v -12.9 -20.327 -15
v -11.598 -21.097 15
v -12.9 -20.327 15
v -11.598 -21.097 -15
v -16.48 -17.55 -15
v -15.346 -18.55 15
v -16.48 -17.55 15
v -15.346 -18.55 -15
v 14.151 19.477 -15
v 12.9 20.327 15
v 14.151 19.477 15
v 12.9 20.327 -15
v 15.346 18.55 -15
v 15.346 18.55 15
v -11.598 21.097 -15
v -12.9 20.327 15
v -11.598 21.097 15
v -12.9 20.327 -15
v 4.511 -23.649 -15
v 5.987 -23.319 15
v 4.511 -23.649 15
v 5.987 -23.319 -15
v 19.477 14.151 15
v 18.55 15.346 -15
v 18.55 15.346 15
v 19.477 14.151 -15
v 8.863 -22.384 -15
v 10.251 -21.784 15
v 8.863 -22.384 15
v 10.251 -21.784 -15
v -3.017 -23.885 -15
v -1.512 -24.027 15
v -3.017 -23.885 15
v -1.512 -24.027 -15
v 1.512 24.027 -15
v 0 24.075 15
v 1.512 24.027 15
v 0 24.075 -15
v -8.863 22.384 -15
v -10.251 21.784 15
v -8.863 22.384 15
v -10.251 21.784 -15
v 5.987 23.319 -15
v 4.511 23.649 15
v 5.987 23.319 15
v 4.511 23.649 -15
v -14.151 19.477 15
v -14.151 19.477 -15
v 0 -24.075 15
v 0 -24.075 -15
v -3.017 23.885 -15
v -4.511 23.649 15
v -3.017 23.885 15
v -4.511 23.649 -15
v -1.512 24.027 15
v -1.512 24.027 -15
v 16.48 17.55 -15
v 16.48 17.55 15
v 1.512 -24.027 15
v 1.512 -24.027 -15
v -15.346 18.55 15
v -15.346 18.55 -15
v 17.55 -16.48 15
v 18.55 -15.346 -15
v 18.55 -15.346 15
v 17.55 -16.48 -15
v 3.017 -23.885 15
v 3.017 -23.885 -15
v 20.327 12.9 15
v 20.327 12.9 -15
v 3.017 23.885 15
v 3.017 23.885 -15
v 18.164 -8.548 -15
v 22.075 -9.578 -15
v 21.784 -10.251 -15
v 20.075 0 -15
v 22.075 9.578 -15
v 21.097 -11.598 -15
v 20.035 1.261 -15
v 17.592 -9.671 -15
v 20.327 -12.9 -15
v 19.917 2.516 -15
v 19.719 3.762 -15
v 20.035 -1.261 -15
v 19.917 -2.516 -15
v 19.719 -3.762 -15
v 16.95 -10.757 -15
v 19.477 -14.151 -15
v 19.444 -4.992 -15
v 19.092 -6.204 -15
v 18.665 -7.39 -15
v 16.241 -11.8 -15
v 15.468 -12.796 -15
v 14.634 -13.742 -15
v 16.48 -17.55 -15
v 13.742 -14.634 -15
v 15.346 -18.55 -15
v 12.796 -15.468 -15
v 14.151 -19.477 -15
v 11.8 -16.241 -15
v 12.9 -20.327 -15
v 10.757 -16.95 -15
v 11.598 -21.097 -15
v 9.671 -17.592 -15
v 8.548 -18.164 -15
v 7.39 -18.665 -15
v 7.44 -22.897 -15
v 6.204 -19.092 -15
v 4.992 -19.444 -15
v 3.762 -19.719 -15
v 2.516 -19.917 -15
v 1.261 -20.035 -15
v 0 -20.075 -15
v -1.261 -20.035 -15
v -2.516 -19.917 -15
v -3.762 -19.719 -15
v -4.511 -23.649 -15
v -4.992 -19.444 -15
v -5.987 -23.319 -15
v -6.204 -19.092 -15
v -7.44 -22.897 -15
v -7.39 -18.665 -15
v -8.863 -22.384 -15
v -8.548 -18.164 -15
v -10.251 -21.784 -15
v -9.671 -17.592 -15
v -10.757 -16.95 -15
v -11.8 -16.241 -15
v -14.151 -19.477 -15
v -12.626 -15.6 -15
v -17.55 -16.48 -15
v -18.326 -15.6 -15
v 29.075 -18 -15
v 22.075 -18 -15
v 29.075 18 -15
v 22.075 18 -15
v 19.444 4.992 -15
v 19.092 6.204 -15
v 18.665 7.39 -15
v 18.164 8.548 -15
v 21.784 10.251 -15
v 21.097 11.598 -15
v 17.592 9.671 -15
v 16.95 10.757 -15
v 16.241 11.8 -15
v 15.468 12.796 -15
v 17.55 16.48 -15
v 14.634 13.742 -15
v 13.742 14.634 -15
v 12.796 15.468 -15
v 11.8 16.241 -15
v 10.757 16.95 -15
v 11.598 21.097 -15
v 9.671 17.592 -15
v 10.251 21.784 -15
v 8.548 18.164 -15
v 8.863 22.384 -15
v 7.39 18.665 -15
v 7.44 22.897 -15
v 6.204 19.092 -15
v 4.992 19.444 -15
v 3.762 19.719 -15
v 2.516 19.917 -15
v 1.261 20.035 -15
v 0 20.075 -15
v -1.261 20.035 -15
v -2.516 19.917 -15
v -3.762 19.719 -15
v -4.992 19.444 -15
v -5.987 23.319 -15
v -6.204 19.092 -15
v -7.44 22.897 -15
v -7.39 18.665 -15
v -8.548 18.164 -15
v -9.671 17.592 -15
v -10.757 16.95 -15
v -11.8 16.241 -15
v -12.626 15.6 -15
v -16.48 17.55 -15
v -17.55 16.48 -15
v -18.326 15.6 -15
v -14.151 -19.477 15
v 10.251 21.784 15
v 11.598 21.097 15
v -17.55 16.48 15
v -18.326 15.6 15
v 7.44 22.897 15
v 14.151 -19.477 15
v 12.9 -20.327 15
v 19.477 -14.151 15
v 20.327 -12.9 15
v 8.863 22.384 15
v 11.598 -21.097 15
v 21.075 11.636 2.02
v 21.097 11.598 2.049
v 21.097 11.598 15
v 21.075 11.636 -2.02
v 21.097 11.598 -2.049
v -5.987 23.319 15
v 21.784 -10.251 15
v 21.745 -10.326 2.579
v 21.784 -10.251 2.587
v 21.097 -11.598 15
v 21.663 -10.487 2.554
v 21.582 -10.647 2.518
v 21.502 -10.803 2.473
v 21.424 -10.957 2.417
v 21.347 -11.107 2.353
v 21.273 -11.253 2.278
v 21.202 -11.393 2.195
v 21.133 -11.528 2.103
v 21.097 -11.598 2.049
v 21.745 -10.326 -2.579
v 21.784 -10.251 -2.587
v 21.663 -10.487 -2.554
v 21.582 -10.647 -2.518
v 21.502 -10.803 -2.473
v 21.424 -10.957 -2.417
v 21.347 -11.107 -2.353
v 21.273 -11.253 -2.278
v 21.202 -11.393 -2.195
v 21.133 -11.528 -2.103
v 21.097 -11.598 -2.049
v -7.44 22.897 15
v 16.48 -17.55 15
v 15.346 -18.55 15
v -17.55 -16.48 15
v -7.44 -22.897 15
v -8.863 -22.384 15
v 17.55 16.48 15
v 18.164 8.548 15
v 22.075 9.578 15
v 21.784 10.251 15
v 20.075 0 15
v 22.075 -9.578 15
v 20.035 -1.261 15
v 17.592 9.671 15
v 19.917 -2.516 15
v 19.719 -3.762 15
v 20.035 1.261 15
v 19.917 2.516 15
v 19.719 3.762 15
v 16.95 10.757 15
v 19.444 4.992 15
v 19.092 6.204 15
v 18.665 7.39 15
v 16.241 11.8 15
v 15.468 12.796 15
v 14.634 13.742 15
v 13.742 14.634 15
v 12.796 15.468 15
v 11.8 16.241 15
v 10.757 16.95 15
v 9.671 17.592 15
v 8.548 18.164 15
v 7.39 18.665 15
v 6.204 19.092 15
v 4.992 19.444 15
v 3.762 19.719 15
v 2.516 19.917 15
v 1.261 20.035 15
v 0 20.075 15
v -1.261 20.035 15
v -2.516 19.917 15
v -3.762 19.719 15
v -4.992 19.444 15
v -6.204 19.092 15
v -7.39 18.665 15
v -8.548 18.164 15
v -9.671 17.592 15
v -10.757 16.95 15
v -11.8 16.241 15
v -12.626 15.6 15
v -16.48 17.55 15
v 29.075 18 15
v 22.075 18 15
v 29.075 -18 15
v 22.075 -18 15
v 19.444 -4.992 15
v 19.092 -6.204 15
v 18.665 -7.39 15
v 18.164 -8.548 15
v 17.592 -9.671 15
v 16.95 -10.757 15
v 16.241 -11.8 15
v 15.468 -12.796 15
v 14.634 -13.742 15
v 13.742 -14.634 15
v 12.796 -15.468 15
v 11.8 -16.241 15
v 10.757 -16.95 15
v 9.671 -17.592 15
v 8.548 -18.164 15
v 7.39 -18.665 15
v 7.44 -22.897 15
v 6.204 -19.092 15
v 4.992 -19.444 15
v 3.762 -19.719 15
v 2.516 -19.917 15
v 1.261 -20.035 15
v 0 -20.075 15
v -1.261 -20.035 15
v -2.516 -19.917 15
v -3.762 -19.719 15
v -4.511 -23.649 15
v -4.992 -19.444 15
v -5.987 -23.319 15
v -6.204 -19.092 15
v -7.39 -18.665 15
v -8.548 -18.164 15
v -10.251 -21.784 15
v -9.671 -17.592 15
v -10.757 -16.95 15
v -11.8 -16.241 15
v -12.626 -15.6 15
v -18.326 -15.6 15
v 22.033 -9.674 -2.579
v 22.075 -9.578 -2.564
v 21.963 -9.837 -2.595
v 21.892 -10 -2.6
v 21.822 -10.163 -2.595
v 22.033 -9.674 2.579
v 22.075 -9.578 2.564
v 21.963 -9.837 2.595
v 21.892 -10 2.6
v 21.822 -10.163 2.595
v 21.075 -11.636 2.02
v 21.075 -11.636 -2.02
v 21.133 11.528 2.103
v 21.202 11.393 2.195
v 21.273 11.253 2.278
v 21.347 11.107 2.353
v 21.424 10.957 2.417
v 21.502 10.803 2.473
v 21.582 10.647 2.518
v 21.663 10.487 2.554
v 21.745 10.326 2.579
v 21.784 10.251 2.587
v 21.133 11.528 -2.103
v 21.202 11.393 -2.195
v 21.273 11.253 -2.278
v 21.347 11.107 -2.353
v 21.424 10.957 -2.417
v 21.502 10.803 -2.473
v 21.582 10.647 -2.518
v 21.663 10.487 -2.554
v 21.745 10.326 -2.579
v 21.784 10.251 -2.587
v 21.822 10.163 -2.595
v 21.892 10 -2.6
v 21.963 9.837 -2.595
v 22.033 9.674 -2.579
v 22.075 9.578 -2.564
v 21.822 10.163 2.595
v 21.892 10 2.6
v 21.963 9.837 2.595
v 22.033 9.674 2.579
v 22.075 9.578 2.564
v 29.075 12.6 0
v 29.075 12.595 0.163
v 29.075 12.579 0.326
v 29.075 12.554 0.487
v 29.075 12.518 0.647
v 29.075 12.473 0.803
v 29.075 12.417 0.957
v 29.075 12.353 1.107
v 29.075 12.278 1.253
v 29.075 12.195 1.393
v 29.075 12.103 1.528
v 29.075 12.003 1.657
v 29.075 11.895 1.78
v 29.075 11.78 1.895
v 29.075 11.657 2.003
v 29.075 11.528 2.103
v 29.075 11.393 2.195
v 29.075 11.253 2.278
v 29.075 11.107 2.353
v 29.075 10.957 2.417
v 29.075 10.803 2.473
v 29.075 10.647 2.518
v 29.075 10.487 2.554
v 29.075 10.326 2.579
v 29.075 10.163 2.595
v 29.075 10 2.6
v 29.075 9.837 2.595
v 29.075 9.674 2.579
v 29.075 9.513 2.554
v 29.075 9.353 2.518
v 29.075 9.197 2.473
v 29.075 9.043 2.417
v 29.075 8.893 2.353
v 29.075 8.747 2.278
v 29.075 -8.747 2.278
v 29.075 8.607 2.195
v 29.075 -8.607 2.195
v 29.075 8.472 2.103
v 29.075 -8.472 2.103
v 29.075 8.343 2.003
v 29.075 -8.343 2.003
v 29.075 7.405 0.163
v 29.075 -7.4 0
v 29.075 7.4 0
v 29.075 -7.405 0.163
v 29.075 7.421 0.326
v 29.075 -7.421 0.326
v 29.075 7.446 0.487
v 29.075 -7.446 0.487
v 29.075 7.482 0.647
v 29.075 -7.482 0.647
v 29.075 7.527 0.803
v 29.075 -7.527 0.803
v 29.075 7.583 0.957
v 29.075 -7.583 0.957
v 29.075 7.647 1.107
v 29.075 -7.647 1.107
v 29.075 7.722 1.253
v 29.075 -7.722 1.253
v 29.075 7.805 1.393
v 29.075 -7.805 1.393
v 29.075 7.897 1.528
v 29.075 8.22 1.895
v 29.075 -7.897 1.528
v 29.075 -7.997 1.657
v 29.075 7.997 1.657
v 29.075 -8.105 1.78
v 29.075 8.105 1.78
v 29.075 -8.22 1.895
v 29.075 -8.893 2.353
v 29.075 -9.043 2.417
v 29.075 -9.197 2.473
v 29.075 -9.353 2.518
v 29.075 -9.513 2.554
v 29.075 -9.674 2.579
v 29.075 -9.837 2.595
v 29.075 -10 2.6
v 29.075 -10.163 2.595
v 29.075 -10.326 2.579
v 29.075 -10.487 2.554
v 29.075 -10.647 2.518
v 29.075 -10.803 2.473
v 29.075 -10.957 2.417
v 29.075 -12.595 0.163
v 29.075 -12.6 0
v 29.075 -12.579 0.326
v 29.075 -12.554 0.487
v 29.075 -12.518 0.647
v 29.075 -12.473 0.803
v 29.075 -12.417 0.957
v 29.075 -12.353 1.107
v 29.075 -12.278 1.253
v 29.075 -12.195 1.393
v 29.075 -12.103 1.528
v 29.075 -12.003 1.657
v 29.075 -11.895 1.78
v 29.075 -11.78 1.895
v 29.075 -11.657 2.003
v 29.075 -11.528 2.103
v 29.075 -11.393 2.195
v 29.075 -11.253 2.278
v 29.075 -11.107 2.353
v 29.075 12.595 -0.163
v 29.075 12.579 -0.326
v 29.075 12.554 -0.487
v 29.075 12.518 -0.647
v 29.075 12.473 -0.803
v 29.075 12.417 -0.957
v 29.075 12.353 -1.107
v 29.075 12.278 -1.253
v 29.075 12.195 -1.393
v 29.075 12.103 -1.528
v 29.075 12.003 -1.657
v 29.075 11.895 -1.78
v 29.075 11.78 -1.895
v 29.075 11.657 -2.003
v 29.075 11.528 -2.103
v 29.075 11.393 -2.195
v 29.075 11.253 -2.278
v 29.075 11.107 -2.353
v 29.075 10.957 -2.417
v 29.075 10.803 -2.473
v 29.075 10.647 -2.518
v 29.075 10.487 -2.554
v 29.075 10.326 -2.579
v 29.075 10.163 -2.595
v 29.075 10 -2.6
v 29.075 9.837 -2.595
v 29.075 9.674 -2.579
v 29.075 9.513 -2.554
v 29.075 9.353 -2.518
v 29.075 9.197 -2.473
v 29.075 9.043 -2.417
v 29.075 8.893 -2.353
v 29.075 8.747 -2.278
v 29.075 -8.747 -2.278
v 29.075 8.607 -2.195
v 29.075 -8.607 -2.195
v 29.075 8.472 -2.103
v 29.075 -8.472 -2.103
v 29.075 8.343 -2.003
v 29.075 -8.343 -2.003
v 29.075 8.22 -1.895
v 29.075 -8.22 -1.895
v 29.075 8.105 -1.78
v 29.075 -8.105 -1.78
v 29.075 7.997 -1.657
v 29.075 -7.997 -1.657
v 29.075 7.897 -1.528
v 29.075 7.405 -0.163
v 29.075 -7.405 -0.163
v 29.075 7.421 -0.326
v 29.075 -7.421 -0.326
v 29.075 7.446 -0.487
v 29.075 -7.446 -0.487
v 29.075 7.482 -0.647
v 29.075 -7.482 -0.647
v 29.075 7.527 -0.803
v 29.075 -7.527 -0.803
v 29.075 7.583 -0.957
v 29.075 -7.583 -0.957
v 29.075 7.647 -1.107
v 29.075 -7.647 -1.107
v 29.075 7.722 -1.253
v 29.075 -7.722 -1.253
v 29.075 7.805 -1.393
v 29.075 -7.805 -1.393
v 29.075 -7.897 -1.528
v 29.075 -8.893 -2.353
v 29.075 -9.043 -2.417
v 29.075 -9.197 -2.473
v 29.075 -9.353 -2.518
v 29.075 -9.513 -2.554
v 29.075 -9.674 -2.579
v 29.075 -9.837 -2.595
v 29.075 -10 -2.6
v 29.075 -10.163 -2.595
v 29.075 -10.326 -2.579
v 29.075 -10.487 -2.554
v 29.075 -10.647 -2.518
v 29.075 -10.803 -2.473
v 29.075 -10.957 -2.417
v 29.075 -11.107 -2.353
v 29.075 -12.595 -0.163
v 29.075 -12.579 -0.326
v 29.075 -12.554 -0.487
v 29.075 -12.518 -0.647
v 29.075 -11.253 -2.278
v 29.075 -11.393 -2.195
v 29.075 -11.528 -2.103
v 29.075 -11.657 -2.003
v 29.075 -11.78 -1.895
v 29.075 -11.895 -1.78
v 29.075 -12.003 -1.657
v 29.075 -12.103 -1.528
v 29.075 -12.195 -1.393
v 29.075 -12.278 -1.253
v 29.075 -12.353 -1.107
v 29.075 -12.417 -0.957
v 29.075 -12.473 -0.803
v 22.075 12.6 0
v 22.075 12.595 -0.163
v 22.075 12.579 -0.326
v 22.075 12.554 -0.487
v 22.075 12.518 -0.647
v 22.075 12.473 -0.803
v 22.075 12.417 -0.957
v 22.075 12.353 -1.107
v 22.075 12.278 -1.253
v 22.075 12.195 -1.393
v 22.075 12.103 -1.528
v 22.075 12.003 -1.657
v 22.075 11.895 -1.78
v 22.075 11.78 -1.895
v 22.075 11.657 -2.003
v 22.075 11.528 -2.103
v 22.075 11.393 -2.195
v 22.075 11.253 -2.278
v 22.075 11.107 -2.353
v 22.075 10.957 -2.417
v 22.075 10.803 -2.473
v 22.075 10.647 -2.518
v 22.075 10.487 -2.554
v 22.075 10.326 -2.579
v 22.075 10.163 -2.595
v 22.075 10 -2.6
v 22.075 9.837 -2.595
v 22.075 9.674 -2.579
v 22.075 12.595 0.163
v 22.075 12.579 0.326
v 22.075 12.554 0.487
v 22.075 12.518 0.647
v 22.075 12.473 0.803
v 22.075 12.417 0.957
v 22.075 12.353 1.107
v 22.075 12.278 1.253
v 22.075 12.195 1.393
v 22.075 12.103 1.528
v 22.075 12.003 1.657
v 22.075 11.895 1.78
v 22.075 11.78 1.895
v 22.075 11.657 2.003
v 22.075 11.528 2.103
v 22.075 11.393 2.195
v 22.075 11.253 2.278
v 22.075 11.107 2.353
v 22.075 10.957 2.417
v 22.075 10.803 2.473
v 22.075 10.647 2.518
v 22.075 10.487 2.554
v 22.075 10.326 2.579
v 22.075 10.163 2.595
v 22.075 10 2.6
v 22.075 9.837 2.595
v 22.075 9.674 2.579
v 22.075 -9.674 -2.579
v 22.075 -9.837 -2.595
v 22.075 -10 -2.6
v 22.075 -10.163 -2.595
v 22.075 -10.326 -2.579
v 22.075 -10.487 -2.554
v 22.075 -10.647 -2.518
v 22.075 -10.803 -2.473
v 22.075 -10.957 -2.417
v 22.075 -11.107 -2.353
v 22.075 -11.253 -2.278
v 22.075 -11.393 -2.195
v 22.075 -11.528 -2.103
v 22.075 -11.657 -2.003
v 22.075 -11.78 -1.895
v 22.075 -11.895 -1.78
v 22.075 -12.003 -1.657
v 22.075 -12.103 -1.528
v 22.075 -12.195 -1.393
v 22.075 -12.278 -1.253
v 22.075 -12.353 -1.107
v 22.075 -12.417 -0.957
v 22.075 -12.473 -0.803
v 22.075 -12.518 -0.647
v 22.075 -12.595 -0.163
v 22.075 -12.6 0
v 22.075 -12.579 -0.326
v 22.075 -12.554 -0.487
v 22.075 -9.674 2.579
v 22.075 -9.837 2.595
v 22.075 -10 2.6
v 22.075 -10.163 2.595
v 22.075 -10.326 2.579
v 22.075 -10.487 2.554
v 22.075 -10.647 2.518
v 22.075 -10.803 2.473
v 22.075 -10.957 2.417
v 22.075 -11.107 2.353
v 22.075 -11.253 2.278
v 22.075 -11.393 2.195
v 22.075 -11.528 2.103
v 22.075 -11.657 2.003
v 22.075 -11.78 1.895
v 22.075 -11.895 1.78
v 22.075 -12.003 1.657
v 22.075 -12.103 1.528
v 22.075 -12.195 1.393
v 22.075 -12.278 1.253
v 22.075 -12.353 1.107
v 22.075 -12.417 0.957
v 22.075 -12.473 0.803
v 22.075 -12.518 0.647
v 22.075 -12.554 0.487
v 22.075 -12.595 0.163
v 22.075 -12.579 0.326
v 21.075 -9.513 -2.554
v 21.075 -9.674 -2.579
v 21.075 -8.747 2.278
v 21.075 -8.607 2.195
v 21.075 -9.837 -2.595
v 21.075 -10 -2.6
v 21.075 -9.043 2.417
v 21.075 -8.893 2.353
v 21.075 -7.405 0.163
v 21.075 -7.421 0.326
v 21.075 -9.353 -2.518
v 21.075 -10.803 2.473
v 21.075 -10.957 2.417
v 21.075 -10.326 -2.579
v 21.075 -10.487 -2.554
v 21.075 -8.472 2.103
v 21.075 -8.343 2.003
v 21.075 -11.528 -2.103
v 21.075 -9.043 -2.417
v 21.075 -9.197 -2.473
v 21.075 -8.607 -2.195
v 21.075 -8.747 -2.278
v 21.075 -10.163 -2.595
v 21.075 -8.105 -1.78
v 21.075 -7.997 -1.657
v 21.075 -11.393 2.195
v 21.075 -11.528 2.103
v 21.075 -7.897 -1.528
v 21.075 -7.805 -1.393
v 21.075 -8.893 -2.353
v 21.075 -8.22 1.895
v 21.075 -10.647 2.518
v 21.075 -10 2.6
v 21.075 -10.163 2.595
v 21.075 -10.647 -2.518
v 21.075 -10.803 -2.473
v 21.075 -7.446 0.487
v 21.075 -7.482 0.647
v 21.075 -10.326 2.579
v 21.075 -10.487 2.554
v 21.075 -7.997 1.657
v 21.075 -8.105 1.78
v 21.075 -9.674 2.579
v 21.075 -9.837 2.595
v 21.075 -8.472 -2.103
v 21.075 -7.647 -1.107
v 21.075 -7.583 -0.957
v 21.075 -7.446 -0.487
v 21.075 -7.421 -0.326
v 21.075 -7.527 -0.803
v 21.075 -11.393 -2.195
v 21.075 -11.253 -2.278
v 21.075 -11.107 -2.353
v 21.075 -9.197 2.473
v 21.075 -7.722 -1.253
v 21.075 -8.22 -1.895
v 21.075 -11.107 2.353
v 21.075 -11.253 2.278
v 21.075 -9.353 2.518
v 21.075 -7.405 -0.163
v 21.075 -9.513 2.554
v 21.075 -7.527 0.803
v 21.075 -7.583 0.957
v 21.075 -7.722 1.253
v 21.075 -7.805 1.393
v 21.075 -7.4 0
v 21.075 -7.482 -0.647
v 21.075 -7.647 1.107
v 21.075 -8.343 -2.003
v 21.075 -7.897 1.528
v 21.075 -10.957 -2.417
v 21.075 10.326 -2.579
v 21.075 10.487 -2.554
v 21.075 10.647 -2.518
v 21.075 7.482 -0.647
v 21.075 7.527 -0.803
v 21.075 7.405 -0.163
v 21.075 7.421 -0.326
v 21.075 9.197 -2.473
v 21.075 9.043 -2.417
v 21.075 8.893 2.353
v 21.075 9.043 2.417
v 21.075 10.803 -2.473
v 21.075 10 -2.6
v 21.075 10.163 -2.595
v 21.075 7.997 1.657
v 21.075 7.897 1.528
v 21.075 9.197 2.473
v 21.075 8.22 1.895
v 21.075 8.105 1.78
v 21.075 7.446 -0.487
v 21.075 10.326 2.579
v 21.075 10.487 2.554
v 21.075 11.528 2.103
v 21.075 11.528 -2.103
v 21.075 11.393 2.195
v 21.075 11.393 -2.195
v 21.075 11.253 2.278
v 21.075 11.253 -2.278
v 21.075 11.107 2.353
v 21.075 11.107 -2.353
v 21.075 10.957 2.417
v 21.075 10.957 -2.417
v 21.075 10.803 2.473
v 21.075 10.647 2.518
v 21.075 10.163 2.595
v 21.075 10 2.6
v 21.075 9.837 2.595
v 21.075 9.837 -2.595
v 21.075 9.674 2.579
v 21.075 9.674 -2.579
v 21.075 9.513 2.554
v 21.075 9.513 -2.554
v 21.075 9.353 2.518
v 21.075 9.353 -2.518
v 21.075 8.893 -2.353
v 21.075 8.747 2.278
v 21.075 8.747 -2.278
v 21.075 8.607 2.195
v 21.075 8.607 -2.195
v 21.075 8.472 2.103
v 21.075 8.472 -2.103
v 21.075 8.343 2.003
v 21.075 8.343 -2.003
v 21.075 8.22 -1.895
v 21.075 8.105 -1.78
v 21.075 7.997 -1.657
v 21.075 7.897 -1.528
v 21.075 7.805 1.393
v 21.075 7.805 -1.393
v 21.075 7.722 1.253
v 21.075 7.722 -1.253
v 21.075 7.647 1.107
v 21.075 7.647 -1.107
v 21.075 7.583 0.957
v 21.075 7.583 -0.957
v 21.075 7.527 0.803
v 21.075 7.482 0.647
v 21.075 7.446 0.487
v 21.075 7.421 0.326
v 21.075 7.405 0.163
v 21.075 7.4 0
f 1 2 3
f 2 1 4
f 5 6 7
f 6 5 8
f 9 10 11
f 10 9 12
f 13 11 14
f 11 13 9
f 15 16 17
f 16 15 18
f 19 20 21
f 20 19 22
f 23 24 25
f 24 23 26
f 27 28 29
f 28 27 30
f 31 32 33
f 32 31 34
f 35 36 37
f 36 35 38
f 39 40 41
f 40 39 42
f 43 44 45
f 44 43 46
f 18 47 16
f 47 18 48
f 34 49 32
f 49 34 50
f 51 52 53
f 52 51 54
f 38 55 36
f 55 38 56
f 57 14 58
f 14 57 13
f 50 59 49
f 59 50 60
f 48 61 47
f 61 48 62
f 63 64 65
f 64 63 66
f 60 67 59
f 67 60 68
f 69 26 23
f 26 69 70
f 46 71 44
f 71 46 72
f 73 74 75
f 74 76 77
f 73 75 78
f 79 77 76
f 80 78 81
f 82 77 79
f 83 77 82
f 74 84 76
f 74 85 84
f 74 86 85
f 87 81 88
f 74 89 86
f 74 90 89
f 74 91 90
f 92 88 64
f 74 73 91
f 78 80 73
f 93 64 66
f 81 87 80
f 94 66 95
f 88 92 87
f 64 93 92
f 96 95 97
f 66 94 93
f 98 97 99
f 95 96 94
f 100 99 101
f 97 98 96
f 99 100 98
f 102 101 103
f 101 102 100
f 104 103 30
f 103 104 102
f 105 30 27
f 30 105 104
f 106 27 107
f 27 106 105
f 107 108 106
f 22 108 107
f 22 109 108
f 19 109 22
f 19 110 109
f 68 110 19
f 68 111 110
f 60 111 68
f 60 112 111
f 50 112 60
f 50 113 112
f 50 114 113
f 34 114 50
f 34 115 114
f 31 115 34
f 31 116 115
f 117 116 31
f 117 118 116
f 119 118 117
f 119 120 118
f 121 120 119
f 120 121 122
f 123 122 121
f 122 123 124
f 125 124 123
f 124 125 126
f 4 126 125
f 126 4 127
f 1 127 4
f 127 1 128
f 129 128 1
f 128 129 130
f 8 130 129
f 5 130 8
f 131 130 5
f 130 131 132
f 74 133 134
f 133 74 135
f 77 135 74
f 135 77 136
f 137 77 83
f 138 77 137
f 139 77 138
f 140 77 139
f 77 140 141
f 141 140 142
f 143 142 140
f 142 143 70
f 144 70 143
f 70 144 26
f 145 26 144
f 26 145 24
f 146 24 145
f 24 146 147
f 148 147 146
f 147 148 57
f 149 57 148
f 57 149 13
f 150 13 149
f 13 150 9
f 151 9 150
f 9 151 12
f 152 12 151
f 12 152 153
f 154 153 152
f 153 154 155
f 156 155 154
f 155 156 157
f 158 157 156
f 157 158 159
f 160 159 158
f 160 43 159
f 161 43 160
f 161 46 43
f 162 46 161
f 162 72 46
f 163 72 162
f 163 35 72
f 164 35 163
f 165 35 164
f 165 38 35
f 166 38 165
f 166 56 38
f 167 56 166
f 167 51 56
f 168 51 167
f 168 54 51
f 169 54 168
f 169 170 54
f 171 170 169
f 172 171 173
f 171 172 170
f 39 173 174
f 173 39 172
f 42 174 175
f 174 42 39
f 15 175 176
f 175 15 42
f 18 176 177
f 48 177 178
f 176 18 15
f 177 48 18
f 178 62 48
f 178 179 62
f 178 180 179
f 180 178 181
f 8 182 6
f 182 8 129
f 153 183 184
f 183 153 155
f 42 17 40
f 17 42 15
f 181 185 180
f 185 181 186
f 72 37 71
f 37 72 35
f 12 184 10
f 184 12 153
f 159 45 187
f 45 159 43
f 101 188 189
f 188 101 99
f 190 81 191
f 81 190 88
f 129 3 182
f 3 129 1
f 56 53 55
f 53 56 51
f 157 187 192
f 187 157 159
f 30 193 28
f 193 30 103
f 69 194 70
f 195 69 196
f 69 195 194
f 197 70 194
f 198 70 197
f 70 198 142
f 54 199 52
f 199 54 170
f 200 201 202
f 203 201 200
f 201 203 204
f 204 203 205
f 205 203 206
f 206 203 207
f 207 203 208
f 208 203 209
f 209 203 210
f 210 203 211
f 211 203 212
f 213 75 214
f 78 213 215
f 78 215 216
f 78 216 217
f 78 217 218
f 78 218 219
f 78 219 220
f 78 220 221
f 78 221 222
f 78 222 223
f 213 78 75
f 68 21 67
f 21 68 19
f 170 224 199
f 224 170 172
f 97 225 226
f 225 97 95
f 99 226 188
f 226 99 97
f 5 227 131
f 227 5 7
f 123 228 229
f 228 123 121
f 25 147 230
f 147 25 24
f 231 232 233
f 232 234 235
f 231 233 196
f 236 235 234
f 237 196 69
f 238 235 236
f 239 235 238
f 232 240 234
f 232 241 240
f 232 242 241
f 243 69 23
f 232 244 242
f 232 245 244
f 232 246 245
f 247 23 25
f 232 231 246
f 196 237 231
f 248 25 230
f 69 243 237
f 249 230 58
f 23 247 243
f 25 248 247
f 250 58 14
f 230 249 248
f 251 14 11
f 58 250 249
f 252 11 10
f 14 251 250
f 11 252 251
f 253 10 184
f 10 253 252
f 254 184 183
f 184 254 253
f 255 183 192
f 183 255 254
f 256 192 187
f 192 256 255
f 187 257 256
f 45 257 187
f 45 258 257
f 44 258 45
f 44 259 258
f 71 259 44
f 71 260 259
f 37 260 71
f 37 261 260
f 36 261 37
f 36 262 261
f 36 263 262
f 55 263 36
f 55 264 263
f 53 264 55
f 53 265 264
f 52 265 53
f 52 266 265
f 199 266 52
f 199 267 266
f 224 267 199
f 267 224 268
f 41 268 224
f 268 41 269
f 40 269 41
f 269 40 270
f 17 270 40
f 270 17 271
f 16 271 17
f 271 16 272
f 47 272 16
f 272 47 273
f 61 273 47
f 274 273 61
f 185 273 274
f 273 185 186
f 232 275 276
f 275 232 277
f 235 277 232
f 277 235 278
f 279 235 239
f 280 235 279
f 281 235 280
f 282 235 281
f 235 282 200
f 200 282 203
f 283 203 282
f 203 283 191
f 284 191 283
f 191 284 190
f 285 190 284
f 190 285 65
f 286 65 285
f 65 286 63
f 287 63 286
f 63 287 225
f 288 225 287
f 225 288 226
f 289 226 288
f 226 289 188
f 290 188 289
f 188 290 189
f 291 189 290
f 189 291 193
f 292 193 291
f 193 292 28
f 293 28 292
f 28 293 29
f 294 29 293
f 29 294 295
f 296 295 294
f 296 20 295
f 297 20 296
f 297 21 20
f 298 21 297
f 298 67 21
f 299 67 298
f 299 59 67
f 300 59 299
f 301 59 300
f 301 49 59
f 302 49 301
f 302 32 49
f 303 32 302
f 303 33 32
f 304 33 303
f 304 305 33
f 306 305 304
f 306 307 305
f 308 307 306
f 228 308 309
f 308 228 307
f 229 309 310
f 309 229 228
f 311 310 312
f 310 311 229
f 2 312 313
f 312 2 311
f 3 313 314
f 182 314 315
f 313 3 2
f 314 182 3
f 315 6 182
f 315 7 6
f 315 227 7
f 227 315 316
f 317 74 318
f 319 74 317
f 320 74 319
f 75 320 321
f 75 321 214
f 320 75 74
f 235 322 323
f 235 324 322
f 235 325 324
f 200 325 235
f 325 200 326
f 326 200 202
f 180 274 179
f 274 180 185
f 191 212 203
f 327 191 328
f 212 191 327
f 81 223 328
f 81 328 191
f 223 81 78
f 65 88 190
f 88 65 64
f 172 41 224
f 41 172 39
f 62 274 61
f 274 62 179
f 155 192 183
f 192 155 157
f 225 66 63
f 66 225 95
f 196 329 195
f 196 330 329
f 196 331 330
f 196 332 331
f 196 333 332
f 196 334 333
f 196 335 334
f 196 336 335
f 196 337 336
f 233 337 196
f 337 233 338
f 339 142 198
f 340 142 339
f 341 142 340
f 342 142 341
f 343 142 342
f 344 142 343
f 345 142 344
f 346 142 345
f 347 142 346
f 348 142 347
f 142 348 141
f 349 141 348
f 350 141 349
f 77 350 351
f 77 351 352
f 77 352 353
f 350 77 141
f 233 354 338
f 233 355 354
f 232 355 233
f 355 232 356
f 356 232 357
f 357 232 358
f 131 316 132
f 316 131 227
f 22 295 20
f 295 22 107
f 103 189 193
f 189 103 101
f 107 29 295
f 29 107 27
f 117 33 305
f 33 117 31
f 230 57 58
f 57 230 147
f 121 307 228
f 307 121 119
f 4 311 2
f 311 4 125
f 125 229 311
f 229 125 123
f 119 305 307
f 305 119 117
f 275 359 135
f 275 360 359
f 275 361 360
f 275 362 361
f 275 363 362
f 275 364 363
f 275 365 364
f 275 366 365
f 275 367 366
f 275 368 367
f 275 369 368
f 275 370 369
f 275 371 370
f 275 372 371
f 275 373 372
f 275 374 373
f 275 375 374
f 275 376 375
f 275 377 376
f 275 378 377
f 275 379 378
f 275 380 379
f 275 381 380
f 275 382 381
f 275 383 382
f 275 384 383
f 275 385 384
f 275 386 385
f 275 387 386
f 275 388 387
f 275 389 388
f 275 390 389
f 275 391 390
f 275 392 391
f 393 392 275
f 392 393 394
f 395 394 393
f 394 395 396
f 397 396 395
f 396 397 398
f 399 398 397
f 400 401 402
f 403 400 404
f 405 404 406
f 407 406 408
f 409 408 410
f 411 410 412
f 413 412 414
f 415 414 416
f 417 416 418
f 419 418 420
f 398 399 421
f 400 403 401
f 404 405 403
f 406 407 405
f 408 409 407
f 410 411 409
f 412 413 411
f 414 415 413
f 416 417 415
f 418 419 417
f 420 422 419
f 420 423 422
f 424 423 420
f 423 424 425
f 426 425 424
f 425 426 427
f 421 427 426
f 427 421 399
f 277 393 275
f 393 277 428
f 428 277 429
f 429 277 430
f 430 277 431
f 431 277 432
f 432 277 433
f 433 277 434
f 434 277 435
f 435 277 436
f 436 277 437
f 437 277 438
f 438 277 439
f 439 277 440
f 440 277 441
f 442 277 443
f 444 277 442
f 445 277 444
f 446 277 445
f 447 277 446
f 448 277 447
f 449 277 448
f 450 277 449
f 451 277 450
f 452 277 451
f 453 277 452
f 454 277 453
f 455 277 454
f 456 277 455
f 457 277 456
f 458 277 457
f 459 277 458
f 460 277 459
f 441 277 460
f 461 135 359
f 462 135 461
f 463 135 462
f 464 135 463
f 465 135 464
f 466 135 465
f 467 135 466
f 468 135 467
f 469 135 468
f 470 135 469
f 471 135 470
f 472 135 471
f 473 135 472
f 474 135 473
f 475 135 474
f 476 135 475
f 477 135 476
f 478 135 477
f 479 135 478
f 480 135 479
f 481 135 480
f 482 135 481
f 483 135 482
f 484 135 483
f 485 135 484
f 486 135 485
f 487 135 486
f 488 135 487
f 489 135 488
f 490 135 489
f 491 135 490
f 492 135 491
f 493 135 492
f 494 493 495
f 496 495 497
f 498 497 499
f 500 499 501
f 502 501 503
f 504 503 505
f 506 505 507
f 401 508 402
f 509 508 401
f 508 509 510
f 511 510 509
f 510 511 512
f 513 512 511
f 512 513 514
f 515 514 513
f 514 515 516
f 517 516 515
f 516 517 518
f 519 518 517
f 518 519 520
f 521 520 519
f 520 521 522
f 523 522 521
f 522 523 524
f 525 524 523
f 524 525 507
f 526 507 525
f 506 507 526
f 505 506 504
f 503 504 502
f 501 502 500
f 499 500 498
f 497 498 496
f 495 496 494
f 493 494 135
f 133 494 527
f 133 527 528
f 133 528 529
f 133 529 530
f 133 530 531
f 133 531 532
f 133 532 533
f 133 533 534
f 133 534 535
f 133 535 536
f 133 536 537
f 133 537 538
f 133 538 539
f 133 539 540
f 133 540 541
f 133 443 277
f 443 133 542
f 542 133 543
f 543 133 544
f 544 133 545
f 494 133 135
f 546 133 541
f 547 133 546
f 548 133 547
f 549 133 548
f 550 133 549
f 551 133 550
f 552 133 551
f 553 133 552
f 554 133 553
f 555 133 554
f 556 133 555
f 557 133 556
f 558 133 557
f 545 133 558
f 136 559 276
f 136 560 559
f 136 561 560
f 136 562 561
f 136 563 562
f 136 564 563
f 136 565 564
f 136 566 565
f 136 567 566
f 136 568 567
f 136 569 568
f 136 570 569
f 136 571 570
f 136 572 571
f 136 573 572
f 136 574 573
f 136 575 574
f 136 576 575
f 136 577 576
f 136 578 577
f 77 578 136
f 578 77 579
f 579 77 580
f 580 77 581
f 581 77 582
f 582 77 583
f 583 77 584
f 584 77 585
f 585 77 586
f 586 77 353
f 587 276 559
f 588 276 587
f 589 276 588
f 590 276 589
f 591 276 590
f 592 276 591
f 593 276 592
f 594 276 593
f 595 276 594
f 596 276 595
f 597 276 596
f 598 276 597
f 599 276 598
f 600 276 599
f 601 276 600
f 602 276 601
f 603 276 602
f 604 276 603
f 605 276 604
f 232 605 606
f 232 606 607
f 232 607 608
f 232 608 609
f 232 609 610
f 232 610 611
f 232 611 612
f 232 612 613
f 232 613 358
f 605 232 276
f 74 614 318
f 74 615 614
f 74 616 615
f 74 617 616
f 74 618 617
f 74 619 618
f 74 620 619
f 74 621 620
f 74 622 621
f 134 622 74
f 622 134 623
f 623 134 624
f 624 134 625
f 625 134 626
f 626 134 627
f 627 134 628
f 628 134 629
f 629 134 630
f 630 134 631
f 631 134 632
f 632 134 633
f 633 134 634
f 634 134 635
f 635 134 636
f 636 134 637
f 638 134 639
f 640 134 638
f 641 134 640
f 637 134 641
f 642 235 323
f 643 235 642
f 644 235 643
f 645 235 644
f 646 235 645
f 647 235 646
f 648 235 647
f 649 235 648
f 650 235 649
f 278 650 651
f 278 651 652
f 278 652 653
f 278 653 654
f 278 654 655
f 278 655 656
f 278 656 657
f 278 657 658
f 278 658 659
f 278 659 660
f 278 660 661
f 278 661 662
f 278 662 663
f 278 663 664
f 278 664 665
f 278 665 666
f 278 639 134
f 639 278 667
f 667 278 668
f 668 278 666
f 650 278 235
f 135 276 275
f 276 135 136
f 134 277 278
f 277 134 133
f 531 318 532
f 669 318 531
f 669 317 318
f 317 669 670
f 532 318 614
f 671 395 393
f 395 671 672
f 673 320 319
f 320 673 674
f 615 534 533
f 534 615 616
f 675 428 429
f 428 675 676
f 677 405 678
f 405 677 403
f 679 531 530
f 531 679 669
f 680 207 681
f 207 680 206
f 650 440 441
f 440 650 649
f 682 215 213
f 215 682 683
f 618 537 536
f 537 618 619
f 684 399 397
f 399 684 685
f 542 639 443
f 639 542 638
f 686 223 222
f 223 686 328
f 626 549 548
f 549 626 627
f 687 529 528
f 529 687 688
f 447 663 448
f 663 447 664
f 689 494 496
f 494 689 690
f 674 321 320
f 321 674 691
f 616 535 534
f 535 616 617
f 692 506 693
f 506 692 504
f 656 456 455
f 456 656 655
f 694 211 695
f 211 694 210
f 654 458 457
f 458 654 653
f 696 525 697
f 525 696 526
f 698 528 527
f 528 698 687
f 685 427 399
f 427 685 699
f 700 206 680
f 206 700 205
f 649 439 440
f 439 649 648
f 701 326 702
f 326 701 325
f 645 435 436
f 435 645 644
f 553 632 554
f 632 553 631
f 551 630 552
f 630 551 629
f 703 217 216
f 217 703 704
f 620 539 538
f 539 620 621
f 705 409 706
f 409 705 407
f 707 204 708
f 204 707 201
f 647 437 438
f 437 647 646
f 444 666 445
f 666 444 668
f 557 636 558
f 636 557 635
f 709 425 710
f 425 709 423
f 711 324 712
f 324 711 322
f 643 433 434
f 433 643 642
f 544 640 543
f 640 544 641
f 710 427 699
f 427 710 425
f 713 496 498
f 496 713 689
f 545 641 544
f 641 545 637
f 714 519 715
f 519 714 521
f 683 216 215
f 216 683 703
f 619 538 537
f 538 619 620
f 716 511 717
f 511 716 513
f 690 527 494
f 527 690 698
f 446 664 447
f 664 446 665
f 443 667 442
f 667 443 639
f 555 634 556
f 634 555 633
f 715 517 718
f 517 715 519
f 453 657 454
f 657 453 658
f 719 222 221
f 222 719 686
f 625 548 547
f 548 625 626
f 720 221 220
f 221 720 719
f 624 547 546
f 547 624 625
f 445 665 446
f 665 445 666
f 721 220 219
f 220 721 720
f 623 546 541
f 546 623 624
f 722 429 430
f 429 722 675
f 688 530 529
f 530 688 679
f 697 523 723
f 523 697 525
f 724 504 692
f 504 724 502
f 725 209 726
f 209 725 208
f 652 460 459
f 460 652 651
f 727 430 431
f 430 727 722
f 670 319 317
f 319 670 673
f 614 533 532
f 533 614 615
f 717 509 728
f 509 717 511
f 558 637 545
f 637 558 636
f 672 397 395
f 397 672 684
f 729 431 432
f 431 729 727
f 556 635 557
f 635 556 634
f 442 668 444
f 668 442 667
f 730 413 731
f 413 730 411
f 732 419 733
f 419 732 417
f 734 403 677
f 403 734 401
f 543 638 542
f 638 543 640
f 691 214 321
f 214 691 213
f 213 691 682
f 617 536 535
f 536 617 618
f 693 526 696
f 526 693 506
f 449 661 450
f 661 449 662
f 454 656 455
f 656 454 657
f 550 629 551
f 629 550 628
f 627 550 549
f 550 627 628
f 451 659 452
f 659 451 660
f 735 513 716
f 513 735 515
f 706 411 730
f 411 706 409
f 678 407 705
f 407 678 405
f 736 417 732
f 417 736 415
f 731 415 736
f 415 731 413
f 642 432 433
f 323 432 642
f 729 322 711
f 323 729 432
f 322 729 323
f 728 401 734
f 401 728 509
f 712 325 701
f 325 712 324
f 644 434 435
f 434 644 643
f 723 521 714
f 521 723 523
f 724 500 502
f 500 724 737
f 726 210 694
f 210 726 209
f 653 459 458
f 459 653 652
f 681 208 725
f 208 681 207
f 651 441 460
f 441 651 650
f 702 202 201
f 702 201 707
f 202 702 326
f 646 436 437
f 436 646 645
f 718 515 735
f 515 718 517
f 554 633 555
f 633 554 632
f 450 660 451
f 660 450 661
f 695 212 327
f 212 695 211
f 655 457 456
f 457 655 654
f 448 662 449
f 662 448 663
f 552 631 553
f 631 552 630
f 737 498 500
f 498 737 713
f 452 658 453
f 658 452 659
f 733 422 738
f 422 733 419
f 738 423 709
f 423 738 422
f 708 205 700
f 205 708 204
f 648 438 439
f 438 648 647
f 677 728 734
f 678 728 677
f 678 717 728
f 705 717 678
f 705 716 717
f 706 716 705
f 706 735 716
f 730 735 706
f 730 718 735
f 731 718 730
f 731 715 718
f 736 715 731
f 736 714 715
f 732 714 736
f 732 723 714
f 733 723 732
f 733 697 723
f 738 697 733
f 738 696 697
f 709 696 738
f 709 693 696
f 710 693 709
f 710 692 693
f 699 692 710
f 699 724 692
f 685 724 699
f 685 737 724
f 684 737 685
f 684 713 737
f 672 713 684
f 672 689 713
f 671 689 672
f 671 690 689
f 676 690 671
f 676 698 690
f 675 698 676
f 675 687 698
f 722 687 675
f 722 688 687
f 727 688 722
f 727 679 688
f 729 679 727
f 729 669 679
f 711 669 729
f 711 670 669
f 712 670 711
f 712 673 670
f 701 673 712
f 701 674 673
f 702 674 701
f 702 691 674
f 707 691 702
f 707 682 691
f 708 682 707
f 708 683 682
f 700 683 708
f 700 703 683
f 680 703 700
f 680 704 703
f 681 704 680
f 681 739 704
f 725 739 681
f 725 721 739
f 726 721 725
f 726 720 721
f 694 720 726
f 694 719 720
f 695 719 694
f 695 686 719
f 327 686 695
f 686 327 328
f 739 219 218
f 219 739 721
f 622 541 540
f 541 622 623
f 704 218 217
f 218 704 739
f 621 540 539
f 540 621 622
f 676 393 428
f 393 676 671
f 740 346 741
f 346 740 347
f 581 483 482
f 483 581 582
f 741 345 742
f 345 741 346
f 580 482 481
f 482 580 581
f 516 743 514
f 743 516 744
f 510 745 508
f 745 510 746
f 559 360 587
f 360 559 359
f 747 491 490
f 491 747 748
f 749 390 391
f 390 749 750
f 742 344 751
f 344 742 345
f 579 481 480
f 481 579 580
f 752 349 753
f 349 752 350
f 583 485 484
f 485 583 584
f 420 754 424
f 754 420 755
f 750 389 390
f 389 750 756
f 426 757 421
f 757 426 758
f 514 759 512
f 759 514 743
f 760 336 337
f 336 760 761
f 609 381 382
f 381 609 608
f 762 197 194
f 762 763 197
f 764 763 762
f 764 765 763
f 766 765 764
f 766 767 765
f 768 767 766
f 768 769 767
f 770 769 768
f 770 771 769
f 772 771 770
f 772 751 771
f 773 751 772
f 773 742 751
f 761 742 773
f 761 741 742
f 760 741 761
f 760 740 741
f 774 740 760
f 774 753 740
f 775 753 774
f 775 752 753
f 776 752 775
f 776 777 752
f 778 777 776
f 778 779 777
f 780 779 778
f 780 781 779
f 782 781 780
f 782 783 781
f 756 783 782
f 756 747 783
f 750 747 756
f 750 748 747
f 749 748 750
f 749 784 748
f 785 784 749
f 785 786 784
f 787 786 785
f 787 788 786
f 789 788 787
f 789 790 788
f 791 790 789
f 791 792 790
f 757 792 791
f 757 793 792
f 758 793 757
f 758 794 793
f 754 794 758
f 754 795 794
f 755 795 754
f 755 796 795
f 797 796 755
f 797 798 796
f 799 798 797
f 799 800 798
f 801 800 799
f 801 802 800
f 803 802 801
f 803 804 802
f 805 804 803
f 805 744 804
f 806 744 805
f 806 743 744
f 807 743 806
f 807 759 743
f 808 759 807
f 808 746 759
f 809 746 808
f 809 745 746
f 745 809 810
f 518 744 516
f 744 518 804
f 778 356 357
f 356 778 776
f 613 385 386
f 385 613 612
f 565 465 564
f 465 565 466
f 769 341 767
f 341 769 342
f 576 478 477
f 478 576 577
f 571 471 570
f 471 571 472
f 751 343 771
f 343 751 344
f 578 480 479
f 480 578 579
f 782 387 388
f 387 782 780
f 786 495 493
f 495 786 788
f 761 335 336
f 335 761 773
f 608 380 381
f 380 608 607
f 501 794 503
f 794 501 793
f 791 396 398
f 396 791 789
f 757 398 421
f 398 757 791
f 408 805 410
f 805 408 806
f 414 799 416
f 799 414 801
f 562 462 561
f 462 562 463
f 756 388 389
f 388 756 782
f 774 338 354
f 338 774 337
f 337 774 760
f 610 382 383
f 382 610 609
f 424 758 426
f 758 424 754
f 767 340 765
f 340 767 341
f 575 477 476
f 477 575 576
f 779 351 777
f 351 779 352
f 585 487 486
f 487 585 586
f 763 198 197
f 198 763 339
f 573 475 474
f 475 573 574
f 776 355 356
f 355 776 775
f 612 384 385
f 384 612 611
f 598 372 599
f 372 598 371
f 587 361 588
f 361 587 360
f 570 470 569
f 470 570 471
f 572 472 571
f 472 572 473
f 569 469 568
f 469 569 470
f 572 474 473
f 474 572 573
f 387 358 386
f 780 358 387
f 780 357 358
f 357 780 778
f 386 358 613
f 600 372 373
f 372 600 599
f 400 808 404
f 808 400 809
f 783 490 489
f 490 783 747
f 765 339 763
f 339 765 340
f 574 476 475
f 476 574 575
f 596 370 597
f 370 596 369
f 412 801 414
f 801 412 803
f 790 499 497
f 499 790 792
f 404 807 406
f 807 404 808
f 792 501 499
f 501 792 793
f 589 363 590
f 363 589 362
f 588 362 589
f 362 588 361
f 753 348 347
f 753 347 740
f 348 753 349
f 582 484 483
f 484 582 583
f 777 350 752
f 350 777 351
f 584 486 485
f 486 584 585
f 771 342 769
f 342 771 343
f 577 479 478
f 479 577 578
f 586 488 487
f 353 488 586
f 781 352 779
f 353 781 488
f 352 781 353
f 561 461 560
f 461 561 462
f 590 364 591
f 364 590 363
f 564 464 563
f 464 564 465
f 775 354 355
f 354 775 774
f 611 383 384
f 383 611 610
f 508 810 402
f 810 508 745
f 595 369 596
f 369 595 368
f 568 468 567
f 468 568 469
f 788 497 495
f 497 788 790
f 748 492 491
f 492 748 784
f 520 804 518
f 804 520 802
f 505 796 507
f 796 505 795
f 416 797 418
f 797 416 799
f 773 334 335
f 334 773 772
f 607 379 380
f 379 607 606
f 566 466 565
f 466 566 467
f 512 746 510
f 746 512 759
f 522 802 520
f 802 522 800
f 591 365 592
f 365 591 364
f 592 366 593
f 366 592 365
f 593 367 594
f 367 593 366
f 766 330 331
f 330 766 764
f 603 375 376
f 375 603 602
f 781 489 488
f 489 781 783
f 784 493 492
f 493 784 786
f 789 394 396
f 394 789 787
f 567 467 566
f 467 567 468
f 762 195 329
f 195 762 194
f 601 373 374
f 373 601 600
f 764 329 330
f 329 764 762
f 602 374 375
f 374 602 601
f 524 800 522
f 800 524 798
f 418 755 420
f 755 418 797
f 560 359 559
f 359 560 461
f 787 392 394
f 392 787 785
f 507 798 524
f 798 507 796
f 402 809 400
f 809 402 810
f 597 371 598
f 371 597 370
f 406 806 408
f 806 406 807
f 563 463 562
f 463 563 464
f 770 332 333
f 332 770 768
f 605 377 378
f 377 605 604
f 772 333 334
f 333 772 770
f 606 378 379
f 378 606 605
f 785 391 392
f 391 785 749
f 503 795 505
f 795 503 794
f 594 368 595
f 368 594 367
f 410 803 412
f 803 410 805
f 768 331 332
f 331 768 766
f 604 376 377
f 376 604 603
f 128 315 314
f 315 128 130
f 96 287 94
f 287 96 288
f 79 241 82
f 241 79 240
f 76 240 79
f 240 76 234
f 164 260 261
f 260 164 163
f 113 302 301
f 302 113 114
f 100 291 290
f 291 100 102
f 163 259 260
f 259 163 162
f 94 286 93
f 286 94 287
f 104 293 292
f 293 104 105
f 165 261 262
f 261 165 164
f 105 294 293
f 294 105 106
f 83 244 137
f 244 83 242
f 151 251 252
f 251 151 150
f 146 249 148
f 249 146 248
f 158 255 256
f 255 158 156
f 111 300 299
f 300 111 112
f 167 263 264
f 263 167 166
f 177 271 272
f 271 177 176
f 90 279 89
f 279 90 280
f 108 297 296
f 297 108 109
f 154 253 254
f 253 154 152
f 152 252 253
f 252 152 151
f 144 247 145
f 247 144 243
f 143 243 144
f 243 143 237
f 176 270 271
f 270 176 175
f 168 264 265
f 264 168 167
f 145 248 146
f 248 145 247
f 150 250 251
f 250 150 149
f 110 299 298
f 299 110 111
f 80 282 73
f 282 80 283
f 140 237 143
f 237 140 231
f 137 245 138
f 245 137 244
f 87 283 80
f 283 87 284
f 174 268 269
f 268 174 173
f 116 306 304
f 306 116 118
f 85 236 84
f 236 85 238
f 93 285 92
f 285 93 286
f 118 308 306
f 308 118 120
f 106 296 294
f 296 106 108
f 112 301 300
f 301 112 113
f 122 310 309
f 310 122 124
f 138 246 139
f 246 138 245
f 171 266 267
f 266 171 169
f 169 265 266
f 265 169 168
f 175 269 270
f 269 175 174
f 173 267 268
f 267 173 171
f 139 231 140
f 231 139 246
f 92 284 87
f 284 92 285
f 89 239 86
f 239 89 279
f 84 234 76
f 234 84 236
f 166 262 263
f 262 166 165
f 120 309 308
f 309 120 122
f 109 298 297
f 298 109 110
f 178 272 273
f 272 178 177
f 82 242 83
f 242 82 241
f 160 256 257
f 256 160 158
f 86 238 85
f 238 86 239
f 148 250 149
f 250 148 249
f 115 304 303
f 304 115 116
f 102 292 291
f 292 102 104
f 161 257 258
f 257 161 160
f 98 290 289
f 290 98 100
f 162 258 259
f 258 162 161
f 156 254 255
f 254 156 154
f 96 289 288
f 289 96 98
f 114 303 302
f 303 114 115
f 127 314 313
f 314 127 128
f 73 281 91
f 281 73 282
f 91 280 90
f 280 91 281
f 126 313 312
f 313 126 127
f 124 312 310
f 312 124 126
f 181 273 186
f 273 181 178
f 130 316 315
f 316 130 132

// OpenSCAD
/*
 * ENTWURF: Aufklipsbare Rohrschelle (C-Form) mit Universal-2-Loch-Flansch
 * Funktion: Lässt sich nachträglich auf ein montiertes Rohr aufklipsen.
 *           Dient als universelle Basis für Handy-/Tablethalter, Arme, etc.
 */

$fn = 100;

rohr_nennmass = 40.0;
toleranz = 0.15;
innen_durchmesser = rohr_nennmass + toleranz;
wanddicke = (rohr_nennmass <= 25) ? 3.5 : 4.0;
aussen_durchmesser = innen_durchmesser + (wanddicke * 2);
schelle_hoehe = max(22.0, round(rohr_nennmass * 0.75));

// Öffnungswinkel der C-Schelle (ca. 70% umschlossen für guten Schnapp-Halt)
oeffnung_breite = rohr_nennmass * 0.78;

// Universal-Flansch (2× M5 Löcher im 20mm Abstand)
flansch_breite = max(32.0, rohr_nennmass * 0.9);
flansch_dicke = 5.0;
loch_abstand = 20.0;
loch_durchmesser = 5.2;

clip_schelle();

module clip_schelle() {
    difference() {
        union() {
            // C-Ring Grundkörper
            cylinder(d=aussen_durchmesser, h=schelle_hoehe, center=true);
            // Flansch-Platte auf +X
            translate([(aussen_durchmesser/2) + (flansch_dicke/2) - 1, 0, 0])
                cube([flansch_dicke + 2, flansch_breite, schelle_hoehe], center=true);
        }
        // Innenbohrung
        cylinder(d=innen_durchmesser, h=schelle_hoehe + 2, center=true);
        // Öffnungsschlitz auf -X zum Aufklipsen
        translate([-aussen_durchmesser/2, 0, 0])
            cube([aussen_durchmesser, oeffnung_breite, schelle_hoehe + 2], center=true);
        // 2× M5 Montagelöcher im Flansch
        for (y = [-loch_abstand/2, loch_abstand/2]) {
            translate([(aussen_durchmesser/2) + flansch_dicke/2, y, 0])
                rotate([0, 90, 0])
                cylinder(d=loch_durchmesser, h=flansch_dicke + 6, center=true);
        }
    }
}
